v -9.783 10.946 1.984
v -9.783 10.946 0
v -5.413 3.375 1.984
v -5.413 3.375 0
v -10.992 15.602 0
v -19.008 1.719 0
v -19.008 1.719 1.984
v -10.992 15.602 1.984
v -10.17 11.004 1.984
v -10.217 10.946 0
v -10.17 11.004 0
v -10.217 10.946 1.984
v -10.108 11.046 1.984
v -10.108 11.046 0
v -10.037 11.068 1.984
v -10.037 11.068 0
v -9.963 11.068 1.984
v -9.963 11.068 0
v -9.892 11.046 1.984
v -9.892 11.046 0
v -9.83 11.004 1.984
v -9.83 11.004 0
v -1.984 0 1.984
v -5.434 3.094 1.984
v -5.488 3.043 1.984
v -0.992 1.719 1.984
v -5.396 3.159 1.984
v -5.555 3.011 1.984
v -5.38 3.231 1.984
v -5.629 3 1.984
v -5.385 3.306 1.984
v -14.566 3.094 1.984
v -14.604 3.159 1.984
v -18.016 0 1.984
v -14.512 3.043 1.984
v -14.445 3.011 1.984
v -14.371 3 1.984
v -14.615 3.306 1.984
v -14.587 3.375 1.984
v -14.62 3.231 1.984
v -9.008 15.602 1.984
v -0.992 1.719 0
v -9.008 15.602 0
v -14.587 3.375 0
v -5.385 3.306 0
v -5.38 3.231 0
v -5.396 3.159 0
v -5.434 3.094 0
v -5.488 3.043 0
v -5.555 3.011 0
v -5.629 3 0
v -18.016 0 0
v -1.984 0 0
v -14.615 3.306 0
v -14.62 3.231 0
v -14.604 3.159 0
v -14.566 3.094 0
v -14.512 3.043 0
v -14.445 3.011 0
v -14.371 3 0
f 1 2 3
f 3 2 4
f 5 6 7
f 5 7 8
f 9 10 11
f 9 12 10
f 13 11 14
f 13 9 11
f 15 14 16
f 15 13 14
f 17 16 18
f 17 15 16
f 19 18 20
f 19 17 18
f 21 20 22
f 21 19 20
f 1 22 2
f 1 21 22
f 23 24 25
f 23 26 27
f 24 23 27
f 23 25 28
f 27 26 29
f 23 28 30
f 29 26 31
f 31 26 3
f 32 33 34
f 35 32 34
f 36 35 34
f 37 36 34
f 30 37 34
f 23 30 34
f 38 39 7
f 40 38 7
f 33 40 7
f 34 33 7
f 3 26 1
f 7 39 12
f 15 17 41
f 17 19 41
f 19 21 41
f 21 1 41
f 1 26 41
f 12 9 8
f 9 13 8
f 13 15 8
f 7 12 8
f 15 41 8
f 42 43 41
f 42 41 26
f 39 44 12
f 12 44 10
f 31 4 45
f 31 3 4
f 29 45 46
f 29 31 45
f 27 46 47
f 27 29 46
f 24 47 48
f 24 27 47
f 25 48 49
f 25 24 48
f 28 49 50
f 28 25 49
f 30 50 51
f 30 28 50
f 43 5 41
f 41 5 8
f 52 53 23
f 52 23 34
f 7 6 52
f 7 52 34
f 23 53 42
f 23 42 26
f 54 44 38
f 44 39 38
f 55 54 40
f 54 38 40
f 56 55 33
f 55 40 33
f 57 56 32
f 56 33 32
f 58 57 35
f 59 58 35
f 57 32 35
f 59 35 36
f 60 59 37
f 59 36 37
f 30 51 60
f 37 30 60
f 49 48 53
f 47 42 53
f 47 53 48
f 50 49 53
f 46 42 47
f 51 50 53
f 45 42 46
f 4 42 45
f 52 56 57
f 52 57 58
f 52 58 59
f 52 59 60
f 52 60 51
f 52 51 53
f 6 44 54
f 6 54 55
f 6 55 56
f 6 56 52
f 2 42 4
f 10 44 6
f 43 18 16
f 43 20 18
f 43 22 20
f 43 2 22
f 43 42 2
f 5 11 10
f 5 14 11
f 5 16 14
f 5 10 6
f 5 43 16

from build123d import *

# Parameters (mm, degrees)
BOSS_EXTRUDE1_DEPTH = 1.984375
CHAMFER2_SIZE       = 1.984375
CHAMFER4_SIZE       = 1.984375
CHAMFER5_SIZE       = 1.984375
FILLET1_R           = 0.25


with BuildPart() as part:
    # Sketch1 → Boss-Extrude1 (new body)
    with BuildSketch(Plane.XY):
        Polygon((0, 0), (-20, 0), (-10, 17.320508076), align=None)
        Polygon((-14.803847577, 3), (-10, 11.320508076), (-5.196152423, 3), align=None, mode=Mode.SUBTRACT)
    extrude(amount=BOSS_EXTRUDE1_DEPTH)

    # Chamfer2
    chamfer2_edges = [part.edges().sort_by_distance(p)[0] for p in [
        (-20, 0, 0.9921875),
    ]]
    chamfer(chamfer2_edges, length=CHAMFER2_SIZE)

    # Chamfer4
    chamfer4_edges = [part.edges().sort_by_distance(p)[0] for p in [
        (0, 0, 0.9921875),
    ]]
    chamfer(chamfer4_edges, length=CHAMFER4_SIZE)

    # Chamfer5
    chamfer5_edges = [part.edges().sort_by_distance(p)[0] for p in [
        (-10, 17.320508076, 0.9921875),
    ]]
    chamfer(chamfer5_edges, length=CHAMFER5_SIZE)

    # Fillet1
    fillet1_edges = [part.edges().sort_by_distance(p)[0] for p in [
        (-14.803847577, 3, 0.9921875),
        (-5.196152423, 3, 0.9921875),
        (-10, 11.320508076, 0.9921875),
    ]]
    fillet(fillet1_edges, radius=FILLET1_R)


solid = part.part
